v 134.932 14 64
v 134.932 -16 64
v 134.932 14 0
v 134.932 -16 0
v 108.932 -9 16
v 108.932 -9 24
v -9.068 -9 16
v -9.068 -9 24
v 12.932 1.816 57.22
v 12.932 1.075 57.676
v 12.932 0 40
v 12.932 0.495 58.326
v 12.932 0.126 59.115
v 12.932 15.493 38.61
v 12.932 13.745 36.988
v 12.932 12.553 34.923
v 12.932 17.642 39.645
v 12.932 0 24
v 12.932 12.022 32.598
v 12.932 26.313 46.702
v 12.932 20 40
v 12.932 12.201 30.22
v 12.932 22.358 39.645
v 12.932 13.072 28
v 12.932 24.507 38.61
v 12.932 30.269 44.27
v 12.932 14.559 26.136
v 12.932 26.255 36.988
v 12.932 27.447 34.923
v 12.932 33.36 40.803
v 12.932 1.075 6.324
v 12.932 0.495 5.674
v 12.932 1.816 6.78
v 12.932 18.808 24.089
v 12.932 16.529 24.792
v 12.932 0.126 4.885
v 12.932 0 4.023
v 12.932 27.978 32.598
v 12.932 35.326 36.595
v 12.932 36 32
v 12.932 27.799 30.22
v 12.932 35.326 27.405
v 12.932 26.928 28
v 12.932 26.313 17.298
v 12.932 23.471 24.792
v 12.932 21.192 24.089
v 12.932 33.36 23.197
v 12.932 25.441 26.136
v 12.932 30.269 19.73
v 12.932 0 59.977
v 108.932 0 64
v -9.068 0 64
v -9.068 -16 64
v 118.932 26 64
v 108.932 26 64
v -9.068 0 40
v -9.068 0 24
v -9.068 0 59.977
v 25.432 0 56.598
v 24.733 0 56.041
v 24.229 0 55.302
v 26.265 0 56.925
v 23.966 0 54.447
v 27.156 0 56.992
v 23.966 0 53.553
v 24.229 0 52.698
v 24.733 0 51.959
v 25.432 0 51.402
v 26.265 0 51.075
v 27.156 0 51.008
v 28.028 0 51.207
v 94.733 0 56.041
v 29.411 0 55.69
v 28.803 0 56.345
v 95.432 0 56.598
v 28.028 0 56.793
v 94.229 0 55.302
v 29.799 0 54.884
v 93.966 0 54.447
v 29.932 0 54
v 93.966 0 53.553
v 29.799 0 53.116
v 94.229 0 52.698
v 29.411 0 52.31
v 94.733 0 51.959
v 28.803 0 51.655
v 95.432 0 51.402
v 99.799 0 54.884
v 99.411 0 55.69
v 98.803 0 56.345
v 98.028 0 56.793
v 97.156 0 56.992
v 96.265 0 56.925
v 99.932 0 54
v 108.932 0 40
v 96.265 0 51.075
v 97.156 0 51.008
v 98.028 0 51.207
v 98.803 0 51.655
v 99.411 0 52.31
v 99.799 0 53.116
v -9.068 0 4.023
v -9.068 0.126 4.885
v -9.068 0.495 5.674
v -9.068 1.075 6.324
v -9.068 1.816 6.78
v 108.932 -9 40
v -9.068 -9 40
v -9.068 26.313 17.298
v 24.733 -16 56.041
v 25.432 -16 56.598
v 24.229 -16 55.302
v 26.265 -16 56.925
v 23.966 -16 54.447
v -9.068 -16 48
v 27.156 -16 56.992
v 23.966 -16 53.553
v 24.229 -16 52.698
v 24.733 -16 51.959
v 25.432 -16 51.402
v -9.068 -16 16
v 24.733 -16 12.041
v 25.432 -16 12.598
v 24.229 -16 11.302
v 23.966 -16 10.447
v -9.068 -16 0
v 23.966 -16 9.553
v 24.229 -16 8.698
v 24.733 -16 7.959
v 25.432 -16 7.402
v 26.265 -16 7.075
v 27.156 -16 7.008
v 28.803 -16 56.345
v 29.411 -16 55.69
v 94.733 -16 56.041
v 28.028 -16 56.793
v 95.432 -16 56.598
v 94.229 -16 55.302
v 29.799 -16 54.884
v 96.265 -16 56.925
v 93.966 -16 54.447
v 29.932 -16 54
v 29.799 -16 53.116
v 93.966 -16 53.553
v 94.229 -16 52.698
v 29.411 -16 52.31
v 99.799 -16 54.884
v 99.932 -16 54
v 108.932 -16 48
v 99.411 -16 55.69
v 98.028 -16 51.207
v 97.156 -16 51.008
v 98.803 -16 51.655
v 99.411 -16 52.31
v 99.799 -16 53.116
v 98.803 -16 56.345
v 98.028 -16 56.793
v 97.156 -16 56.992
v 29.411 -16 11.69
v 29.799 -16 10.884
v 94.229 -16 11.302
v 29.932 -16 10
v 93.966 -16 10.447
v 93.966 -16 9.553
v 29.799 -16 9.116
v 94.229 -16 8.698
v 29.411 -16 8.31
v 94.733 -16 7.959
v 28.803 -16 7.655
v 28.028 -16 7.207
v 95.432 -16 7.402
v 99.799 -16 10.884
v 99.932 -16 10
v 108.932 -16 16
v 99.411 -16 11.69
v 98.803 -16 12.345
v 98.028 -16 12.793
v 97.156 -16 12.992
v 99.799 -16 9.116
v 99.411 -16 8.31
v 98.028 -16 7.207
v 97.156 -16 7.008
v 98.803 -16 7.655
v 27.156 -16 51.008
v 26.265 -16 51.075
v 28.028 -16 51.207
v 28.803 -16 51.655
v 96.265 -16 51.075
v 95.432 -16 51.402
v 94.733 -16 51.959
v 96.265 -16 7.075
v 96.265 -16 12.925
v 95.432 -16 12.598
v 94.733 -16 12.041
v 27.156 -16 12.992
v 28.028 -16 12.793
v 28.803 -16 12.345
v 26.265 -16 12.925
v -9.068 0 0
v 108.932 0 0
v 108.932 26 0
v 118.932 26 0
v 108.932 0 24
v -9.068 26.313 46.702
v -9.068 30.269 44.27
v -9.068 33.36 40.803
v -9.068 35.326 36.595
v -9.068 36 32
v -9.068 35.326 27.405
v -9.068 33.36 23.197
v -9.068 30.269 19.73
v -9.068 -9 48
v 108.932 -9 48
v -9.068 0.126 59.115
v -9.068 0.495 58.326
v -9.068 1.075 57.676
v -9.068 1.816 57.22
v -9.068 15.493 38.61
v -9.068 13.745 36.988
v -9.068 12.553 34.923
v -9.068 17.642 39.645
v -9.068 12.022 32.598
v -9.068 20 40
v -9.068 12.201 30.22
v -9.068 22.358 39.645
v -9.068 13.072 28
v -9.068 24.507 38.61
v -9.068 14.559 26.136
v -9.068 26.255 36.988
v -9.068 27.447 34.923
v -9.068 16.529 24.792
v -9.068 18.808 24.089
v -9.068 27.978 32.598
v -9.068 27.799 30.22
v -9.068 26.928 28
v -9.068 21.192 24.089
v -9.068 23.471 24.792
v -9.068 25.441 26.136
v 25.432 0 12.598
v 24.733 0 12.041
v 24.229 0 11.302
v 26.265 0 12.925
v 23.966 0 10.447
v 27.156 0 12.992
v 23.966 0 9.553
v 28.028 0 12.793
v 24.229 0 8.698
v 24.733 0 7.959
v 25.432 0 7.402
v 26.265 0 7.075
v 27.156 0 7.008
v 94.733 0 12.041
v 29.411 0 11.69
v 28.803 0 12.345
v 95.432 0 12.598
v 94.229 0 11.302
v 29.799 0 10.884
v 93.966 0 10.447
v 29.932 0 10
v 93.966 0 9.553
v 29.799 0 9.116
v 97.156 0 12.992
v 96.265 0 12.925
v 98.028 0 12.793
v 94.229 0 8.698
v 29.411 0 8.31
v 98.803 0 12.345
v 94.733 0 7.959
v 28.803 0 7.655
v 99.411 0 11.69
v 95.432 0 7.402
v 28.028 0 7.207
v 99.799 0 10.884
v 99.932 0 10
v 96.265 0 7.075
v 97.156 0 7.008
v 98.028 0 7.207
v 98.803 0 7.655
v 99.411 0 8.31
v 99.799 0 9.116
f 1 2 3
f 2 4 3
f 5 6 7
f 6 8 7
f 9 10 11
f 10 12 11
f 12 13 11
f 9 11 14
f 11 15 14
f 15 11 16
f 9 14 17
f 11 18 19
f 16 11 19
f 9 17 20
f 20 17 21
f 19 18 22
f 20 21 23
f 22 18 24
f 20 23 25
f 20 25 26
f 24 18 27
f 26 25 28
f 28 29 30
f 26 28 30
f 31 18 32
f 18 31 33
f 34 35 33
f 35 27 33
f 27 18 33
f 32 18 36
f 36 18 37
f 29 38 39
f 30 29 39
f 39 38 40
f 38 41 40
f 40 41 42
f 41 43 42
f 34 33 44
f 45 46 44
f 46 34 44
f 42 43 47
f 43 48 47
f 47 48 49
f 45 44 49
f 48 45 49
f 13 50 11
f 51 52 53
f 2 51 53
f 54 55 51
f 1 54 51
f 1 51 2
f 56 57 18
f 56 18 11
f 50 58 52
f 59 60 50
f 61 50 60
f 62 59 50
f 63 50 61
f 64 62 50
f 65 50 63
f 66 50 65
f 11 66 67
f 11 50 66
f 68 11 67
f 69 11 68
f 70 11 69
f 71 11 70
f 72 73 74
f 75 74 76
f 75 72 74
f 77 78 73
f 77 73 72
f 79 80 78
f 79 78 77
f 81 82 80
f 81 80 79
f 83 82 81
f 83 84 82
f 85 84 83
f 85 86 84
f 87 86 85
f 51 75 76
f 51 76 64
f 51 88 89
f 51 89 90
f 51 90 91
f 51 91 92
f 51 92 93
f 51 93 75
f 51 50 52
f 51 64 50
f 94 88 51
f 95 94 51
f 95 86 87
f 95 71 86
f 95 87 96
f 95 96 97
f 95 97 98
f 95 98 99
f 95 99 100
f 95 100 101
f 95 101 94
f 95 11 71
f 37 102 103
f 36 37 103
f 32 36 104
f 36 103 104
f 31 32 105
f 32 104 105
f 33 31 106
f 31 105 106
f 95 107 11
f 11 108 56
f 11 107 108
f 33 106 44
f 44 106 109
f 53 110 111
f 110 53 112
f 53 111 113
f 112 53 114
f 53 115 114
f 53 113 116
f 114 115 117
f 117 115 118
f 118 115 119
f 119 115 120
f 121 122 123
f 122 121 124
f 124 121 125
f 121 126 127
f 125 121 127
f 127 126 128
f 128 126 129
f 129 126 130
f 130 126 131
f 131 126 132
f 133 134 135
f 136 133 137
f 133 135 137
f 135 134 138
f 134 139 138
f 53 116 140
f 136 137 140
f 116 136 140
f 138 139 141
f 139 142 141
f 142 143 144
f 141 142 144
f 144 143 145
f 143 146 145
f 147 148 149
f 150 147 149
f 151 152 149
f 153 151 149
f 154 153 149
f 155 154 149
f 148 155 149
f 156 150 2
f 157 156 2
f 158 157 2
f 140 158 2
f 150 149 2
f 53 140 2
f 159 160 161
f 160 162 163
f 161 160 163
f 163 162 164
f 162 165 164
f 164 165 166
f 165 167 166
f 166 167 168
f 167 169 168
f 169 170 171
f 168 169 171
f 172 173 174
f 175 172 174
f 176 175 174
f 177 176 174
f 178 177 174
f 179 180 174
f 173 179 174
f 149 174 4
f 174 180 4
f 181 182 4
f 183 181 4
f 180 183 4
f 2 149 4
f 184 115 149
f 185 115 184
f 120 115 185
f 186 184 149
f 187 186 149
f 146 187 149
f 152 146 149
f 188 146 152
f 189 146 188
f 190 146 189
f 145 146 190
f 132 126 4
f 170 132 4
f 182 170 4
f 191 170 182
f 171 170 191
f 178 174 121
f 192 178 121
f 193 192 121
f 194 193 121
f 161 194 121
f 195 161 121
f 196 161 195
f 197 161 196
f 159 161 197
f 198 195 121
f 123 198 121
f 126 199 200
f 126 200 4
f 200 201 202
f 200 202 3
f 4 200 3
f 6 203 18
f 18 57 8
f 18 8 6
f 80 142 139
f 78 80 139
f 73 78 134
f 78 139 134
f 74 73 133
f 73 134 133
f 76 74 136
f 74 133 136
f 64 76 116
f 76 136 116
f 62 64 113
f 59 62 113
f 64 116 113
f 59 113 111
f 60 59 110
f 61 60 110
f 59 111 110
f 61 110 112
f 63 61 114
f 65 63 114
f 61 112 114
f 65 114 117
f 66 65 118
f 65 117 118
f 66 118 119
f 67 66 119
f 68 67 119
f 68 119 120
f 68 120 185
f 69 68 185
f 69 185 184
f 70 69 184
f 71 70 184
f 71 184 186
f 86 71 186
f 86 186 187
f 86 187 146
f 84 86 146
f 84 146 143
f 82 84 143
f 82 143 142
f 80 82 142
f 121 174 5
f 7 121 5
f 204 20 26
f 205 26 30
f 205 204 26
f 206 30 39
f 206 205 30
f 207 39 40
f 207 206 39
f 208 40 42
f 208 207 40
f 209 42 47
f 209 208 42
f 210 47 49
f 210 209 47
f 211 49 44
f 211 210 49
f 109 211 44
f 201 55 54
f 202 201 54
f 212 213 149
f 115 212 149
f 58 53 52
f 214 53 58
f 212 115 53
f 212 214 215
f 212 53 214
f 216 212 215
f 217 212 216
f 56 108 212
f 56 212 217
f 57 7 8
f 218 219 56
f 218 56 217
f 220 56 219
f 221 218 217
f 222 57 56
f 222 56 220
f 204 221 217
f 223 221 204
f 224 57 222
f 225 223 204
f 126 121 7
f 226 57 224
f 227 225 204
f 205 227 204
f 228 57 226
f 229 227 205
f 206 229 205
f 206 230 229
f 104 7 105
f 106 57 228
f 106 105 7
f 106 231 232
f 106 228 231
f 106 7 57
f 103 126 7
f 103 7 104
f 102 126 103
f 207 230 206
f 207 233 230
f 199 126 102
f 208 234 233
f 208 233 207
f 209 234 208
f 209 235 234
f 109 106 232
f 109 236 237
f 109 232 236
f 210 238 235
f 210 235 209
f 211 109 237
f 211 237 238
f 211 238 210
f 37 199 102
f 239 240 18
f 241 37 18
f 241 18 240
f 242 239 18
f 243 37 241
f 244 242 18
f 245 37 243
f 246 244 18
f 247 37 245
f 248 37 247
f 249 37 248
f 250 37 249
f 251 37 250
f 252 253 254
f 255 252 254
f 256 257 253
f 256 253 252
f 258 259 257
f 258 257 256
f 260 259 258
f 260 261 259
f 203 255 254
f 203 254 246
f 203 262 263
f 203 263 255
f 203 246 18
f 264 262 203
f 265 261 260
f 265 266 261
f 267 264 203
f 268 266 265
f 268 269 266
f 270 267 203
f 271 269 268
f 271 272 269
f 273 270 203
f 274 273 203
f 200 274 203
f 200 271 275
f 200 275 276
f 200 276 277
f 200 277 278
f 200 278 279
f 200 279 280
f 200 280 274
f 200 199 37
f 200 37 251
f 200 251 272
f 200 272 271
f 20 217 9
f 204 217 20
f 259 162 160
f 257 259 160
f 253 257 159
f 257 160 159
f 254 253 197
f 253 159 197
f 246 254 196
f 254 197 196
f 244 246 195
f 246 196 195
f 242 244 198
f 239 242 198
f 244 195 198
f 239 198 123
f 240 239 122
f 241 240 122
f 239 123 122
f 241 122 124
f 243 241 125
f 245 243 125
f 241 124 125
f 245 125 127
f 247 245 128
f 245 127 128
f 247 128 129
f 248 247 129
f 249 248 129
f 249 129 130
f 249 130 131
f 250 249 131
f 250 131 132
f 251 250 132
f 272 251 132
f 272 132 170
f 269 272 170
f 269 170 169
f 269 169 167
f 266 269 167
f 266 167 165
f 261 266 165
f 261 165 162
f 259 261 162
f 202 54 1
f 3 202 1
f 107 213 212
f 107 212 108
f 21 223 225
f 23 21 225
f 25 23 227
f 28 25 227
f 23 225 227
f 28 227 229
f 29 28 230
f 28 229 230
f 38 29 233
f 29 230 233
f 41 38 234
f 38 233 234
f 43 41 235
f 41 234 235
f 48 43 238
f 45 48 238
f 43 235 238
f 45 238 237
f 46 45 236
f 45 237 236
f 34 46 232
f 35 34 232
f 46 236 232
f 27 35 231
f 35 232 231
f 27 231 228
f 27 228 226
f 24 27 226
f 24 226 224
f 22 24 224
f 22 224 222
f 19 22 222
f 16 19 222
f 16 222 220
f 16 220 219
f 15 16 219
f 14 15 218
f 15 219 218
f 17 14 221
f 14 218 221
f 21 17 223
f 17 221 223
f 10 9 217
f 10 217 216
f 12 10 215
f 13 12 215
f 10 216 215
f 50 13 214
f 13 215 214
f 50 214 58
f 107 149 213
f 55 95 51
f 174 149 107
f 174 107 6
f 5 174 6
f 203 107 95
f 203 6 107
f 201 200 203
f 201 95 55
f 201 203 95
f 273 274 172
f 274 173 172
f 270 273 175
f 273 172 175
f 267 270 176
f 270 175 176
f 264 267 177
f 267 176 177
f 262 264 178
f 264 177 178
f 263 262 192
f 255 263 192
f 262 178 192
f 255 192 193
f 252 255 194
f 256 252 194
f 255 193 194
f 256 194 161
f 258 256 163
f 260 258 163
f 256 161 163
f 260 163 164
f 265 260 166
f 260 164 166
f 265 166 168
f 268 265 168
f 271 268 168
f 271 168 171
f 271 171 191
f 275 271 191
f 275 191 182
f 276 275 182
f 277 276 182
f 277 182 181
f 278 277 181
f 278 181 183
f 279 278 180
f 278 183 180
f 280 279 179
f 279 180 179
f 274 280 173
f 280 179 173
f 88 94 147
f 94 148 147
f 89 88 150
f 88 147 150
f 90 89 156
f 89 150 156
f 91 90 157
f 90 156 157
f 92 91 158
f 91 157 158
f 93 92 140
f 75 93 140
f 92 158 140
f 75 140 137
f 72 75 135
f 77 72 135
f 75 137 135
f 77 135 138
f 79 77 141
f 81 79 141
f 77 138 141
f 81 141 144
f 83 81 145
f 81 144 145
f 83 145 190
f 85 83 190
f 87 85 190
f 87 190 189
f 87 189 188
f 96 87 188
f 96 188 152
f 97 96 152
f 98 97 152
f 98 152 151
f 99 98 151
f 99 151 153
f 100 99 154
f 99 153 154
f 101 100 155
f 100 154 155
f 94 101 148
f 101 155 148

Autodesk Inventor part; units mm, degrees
ref_plane "YZ Plane" through (0, 0, 0) normal (1, 0, 0) x (0, 1, 0)
ref_plane "XZ Plane" through (0, 0, 0) normal (0, 1, 0) x (-1, 0, 0)
ref_plane "XY Plane" through (0, 0, 0) normal (0, 0, 1) x (1, 0, 0)
sketch "Sketch1" plane through (0, 0, 0) normal (0, 0, 1) x (1, 0, 0)
  line L0 (12.9321, 0) -> (108.9321, 0)
  line L1 (108.9321, -16) -> (-9.0679, -16)
  line L2 (-9.0679, -16) -> (-9.0679, 0)
  line L3 (12.9321, 0) -> (12.9321, 36)
  line L4 (12.9321, 36) -> (-9.0679, 36)
  line L5 (-9.0679, 36) -> (-9.0679, 0)
  line L6 (108.9321, -16) -> (134.9321, -16)
  line L7 (134.9321, -16) -> (134.9321, 14)
  line L8 (108.9321, 0) -> (108.9321, 26)
  line L9 (108.9321, 26) -> (118.9321, 26)
  line L10 (118.9321, 26) -> (134.9321, 14)
  point P0 (0, 0)
  dimension "d0" = 118
  dimension "d1" = 16
  dimension "d2" = 22
  dimension "d3" = 36
  dimension "d4" = 26
  dimension "d5" = 30
  dimension "d6" = 26
  dimension "d7" = 10
extrude "Extrusion1" add sketch "Sketch1" along normal blind 64
sketch "Sketch2" plane through (-9.0679, -16, 0) normal (-1, 0, 0) x (0, 0, 1)
  circle A0 centre (32, 36) radius 8
  line L0 (0, 0) -> (64, 0) projected
  line L1 (0, 52) -> (0, 0) projected
  line L2 (0, 16) -> (64, 16) projected
  line L3 (0, 16) -> (4.0233, 16)
  line L4 (64, 16) -> (59.9767, 16)
  arc A1 (46.702, 42.3127) -> (17.298, 42.3127) centre (32, 36) ccw
  line L5 (57.2201, 17.8164) -> (46.702, 42.3127)
  line L6 (6.7799, 17.8164) -> (17.298, 42.3127)
  arc A2 (4.0233, 16) -> (6.7799, 17.8164) centre (4.0233, 19) ccw
  arc A3 (57.2201, 17.8164) -> (59.9767, 16) centre (59.9767, 19) ccw
  line L7 (0, 16) -> (0, 52)
  line L8 (0, 52) -> (64, 52) projected
  line L9 (64, 52) -> (64, 16)
  line L10 (64, 52) -> (64, 0) projected
  point P0 (6, 16)
  point P1 (58, 16)
  point P2 (32, 52)
  dimension "d10" = 16
  dimension "d11" = 36
  dimension "d12" = 32
  dimension "d13" = 6
  dimension "d14" = 6
  dimension "d15" = 3
  dimension "d16" = 3
extrude "Extrusion2" cut sketch "Sketch2" against normal blind 22 contours A0 | L1 L8 A1 L6 A2 L2 | L2 A3 L5 A1 L8 L9
sketch "Sketch3" plane through (-9.0679, -16, 0) normal (-1, 0, 0) x (0, 0, 1)
  line L0 (0, 0) -> (64, 0) projected
  line L1 (0, 16) -> (64, 16) projected
  line L2 (48, 0) -> (16, 0)
  line L3 (16, 0) -> (16, 7)
  line L4 (24, 16) -> (40, 16)
  line L5 (48, 7) -> (48, 0)
  line L6 (0, 16) -> (0, 0) projected
  line L7 (64, 16) -> (64, 0) projected
  line L8 (24, 16) -> (24, 7)
  line L9 (24, 7) -> (16, 7)
  line L10 (48, 7) -> (40, 7)
  line L11 (40, 7) -> (40, 16)
  point P0 (16, 0)
  dimension "d19" = 16
  dimension "d20" = 16
  dimension "d21" = 9
  dimension "d22" = 8
  dimension "d23" = 8
extrude "Extrusion3" cut sketch "Sketch3" against normal blind 118 contours L3 L9 L8 L1 L11 L10 L5 L0
sketch "Sketch4" plane through (-9.0679, -16, 0) normal (0, -1, 0) x (1, 0, 0)
  circle A0 centre (36, 54) radius 3
  line L0 (0, 48) -> (0, 64) projected
  line L1 (0, 64) -> (144, 64) projected
  circle A1 centre (106, 54) radius 3
  circle A2 centre (36, 10) radius 3
  circle A3 centre (106, 10) radius 3
  point P0 (9.0679, 0)
  dimension "d26" = 6
  dimension "d27" = 36
  dimension "d28" = 10
  dimension "d31" = 70
  dimension "d34" = 44
extrude "Extrusion4" cut sketch "Sketch4" against normal through all
properties part number "first"
